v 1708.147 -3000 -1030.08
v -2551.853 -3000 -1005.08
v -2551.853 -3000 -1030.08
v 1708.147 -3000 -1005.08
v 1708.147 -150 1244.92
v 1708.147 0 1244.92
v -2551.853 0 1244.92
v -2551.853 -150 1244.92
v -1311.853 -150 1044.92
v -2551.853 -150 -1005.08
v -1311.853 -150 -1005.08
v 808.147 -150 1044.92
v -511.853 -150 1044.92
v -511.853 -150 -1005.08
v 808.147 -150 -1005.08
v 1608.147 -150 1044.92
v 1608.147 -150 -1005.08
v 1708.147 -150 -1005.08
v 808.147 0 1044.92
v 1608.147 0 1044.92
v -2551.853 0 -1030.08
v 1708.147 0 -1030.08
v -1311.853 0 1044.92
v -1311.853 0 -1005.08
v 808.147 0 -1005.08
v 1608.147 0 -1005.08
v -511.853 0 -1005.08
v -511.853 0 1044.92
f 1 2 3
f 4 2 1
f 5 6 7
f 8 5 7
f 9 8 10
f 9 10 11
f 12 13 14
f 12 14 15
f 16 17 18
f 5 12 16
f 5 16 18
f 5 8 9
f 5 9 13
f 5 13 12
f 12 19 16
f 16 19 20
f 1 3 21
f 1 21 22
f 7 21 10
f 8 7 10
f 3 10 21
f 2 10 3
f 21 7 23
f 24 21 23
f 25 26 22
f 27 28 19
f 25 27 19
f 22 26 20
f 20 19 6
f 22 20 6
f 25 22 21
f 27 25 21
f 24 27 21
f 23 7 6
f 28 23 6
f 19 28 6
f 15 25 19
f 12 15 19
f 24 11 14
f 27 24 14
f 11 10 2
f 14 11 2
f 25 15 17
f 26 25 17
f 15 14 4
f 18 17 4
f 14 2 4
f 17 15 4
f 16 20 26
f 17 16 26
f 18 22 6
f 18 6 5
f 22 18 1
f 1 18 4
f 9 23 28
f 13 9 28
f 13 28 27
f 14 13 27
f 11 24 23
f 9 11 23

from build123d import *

# Parameters (mm, degrees)
F1_DEPTH = 150
F2_W     = 4260
F2_H     = 3000
F3_DEPTH = 25


with BuildPart() as f1:
    # F0 (on Front) → F1 (new body)
    with BuildSketch(Plane.XZ):
        Polygon((1708.14704, 1244.919891), (-2551.85296, 1244.919891), (-2551.85296, -1005.080109), (-1311.85296, -1005.080109), (-1311.85296, 1044.919891), (-511.85296, 1044.919891), (-511.85296, -1005.080109), (808.14704, -1005.080109), (808.14704, 1044.919891), (1608.14704, 1044.919891), (1608.14704, -1005.080109), (1708.14704, -1005.080109), align=None)
    extrude(amount=F1_DEPTH)

    # F2 (on face) → F3 (join)
    with BuildSketch(Plane(origin=(0, 0, -1005.080109), x_dir=(1, 0, 0), z_dir=(0, 0, -1))):
        with Locations((-421.85296, 1500)):
            Rectangle(F2_W, F2_H)
    extrude(amount=F3_DEPTH)


solid = f1.part
